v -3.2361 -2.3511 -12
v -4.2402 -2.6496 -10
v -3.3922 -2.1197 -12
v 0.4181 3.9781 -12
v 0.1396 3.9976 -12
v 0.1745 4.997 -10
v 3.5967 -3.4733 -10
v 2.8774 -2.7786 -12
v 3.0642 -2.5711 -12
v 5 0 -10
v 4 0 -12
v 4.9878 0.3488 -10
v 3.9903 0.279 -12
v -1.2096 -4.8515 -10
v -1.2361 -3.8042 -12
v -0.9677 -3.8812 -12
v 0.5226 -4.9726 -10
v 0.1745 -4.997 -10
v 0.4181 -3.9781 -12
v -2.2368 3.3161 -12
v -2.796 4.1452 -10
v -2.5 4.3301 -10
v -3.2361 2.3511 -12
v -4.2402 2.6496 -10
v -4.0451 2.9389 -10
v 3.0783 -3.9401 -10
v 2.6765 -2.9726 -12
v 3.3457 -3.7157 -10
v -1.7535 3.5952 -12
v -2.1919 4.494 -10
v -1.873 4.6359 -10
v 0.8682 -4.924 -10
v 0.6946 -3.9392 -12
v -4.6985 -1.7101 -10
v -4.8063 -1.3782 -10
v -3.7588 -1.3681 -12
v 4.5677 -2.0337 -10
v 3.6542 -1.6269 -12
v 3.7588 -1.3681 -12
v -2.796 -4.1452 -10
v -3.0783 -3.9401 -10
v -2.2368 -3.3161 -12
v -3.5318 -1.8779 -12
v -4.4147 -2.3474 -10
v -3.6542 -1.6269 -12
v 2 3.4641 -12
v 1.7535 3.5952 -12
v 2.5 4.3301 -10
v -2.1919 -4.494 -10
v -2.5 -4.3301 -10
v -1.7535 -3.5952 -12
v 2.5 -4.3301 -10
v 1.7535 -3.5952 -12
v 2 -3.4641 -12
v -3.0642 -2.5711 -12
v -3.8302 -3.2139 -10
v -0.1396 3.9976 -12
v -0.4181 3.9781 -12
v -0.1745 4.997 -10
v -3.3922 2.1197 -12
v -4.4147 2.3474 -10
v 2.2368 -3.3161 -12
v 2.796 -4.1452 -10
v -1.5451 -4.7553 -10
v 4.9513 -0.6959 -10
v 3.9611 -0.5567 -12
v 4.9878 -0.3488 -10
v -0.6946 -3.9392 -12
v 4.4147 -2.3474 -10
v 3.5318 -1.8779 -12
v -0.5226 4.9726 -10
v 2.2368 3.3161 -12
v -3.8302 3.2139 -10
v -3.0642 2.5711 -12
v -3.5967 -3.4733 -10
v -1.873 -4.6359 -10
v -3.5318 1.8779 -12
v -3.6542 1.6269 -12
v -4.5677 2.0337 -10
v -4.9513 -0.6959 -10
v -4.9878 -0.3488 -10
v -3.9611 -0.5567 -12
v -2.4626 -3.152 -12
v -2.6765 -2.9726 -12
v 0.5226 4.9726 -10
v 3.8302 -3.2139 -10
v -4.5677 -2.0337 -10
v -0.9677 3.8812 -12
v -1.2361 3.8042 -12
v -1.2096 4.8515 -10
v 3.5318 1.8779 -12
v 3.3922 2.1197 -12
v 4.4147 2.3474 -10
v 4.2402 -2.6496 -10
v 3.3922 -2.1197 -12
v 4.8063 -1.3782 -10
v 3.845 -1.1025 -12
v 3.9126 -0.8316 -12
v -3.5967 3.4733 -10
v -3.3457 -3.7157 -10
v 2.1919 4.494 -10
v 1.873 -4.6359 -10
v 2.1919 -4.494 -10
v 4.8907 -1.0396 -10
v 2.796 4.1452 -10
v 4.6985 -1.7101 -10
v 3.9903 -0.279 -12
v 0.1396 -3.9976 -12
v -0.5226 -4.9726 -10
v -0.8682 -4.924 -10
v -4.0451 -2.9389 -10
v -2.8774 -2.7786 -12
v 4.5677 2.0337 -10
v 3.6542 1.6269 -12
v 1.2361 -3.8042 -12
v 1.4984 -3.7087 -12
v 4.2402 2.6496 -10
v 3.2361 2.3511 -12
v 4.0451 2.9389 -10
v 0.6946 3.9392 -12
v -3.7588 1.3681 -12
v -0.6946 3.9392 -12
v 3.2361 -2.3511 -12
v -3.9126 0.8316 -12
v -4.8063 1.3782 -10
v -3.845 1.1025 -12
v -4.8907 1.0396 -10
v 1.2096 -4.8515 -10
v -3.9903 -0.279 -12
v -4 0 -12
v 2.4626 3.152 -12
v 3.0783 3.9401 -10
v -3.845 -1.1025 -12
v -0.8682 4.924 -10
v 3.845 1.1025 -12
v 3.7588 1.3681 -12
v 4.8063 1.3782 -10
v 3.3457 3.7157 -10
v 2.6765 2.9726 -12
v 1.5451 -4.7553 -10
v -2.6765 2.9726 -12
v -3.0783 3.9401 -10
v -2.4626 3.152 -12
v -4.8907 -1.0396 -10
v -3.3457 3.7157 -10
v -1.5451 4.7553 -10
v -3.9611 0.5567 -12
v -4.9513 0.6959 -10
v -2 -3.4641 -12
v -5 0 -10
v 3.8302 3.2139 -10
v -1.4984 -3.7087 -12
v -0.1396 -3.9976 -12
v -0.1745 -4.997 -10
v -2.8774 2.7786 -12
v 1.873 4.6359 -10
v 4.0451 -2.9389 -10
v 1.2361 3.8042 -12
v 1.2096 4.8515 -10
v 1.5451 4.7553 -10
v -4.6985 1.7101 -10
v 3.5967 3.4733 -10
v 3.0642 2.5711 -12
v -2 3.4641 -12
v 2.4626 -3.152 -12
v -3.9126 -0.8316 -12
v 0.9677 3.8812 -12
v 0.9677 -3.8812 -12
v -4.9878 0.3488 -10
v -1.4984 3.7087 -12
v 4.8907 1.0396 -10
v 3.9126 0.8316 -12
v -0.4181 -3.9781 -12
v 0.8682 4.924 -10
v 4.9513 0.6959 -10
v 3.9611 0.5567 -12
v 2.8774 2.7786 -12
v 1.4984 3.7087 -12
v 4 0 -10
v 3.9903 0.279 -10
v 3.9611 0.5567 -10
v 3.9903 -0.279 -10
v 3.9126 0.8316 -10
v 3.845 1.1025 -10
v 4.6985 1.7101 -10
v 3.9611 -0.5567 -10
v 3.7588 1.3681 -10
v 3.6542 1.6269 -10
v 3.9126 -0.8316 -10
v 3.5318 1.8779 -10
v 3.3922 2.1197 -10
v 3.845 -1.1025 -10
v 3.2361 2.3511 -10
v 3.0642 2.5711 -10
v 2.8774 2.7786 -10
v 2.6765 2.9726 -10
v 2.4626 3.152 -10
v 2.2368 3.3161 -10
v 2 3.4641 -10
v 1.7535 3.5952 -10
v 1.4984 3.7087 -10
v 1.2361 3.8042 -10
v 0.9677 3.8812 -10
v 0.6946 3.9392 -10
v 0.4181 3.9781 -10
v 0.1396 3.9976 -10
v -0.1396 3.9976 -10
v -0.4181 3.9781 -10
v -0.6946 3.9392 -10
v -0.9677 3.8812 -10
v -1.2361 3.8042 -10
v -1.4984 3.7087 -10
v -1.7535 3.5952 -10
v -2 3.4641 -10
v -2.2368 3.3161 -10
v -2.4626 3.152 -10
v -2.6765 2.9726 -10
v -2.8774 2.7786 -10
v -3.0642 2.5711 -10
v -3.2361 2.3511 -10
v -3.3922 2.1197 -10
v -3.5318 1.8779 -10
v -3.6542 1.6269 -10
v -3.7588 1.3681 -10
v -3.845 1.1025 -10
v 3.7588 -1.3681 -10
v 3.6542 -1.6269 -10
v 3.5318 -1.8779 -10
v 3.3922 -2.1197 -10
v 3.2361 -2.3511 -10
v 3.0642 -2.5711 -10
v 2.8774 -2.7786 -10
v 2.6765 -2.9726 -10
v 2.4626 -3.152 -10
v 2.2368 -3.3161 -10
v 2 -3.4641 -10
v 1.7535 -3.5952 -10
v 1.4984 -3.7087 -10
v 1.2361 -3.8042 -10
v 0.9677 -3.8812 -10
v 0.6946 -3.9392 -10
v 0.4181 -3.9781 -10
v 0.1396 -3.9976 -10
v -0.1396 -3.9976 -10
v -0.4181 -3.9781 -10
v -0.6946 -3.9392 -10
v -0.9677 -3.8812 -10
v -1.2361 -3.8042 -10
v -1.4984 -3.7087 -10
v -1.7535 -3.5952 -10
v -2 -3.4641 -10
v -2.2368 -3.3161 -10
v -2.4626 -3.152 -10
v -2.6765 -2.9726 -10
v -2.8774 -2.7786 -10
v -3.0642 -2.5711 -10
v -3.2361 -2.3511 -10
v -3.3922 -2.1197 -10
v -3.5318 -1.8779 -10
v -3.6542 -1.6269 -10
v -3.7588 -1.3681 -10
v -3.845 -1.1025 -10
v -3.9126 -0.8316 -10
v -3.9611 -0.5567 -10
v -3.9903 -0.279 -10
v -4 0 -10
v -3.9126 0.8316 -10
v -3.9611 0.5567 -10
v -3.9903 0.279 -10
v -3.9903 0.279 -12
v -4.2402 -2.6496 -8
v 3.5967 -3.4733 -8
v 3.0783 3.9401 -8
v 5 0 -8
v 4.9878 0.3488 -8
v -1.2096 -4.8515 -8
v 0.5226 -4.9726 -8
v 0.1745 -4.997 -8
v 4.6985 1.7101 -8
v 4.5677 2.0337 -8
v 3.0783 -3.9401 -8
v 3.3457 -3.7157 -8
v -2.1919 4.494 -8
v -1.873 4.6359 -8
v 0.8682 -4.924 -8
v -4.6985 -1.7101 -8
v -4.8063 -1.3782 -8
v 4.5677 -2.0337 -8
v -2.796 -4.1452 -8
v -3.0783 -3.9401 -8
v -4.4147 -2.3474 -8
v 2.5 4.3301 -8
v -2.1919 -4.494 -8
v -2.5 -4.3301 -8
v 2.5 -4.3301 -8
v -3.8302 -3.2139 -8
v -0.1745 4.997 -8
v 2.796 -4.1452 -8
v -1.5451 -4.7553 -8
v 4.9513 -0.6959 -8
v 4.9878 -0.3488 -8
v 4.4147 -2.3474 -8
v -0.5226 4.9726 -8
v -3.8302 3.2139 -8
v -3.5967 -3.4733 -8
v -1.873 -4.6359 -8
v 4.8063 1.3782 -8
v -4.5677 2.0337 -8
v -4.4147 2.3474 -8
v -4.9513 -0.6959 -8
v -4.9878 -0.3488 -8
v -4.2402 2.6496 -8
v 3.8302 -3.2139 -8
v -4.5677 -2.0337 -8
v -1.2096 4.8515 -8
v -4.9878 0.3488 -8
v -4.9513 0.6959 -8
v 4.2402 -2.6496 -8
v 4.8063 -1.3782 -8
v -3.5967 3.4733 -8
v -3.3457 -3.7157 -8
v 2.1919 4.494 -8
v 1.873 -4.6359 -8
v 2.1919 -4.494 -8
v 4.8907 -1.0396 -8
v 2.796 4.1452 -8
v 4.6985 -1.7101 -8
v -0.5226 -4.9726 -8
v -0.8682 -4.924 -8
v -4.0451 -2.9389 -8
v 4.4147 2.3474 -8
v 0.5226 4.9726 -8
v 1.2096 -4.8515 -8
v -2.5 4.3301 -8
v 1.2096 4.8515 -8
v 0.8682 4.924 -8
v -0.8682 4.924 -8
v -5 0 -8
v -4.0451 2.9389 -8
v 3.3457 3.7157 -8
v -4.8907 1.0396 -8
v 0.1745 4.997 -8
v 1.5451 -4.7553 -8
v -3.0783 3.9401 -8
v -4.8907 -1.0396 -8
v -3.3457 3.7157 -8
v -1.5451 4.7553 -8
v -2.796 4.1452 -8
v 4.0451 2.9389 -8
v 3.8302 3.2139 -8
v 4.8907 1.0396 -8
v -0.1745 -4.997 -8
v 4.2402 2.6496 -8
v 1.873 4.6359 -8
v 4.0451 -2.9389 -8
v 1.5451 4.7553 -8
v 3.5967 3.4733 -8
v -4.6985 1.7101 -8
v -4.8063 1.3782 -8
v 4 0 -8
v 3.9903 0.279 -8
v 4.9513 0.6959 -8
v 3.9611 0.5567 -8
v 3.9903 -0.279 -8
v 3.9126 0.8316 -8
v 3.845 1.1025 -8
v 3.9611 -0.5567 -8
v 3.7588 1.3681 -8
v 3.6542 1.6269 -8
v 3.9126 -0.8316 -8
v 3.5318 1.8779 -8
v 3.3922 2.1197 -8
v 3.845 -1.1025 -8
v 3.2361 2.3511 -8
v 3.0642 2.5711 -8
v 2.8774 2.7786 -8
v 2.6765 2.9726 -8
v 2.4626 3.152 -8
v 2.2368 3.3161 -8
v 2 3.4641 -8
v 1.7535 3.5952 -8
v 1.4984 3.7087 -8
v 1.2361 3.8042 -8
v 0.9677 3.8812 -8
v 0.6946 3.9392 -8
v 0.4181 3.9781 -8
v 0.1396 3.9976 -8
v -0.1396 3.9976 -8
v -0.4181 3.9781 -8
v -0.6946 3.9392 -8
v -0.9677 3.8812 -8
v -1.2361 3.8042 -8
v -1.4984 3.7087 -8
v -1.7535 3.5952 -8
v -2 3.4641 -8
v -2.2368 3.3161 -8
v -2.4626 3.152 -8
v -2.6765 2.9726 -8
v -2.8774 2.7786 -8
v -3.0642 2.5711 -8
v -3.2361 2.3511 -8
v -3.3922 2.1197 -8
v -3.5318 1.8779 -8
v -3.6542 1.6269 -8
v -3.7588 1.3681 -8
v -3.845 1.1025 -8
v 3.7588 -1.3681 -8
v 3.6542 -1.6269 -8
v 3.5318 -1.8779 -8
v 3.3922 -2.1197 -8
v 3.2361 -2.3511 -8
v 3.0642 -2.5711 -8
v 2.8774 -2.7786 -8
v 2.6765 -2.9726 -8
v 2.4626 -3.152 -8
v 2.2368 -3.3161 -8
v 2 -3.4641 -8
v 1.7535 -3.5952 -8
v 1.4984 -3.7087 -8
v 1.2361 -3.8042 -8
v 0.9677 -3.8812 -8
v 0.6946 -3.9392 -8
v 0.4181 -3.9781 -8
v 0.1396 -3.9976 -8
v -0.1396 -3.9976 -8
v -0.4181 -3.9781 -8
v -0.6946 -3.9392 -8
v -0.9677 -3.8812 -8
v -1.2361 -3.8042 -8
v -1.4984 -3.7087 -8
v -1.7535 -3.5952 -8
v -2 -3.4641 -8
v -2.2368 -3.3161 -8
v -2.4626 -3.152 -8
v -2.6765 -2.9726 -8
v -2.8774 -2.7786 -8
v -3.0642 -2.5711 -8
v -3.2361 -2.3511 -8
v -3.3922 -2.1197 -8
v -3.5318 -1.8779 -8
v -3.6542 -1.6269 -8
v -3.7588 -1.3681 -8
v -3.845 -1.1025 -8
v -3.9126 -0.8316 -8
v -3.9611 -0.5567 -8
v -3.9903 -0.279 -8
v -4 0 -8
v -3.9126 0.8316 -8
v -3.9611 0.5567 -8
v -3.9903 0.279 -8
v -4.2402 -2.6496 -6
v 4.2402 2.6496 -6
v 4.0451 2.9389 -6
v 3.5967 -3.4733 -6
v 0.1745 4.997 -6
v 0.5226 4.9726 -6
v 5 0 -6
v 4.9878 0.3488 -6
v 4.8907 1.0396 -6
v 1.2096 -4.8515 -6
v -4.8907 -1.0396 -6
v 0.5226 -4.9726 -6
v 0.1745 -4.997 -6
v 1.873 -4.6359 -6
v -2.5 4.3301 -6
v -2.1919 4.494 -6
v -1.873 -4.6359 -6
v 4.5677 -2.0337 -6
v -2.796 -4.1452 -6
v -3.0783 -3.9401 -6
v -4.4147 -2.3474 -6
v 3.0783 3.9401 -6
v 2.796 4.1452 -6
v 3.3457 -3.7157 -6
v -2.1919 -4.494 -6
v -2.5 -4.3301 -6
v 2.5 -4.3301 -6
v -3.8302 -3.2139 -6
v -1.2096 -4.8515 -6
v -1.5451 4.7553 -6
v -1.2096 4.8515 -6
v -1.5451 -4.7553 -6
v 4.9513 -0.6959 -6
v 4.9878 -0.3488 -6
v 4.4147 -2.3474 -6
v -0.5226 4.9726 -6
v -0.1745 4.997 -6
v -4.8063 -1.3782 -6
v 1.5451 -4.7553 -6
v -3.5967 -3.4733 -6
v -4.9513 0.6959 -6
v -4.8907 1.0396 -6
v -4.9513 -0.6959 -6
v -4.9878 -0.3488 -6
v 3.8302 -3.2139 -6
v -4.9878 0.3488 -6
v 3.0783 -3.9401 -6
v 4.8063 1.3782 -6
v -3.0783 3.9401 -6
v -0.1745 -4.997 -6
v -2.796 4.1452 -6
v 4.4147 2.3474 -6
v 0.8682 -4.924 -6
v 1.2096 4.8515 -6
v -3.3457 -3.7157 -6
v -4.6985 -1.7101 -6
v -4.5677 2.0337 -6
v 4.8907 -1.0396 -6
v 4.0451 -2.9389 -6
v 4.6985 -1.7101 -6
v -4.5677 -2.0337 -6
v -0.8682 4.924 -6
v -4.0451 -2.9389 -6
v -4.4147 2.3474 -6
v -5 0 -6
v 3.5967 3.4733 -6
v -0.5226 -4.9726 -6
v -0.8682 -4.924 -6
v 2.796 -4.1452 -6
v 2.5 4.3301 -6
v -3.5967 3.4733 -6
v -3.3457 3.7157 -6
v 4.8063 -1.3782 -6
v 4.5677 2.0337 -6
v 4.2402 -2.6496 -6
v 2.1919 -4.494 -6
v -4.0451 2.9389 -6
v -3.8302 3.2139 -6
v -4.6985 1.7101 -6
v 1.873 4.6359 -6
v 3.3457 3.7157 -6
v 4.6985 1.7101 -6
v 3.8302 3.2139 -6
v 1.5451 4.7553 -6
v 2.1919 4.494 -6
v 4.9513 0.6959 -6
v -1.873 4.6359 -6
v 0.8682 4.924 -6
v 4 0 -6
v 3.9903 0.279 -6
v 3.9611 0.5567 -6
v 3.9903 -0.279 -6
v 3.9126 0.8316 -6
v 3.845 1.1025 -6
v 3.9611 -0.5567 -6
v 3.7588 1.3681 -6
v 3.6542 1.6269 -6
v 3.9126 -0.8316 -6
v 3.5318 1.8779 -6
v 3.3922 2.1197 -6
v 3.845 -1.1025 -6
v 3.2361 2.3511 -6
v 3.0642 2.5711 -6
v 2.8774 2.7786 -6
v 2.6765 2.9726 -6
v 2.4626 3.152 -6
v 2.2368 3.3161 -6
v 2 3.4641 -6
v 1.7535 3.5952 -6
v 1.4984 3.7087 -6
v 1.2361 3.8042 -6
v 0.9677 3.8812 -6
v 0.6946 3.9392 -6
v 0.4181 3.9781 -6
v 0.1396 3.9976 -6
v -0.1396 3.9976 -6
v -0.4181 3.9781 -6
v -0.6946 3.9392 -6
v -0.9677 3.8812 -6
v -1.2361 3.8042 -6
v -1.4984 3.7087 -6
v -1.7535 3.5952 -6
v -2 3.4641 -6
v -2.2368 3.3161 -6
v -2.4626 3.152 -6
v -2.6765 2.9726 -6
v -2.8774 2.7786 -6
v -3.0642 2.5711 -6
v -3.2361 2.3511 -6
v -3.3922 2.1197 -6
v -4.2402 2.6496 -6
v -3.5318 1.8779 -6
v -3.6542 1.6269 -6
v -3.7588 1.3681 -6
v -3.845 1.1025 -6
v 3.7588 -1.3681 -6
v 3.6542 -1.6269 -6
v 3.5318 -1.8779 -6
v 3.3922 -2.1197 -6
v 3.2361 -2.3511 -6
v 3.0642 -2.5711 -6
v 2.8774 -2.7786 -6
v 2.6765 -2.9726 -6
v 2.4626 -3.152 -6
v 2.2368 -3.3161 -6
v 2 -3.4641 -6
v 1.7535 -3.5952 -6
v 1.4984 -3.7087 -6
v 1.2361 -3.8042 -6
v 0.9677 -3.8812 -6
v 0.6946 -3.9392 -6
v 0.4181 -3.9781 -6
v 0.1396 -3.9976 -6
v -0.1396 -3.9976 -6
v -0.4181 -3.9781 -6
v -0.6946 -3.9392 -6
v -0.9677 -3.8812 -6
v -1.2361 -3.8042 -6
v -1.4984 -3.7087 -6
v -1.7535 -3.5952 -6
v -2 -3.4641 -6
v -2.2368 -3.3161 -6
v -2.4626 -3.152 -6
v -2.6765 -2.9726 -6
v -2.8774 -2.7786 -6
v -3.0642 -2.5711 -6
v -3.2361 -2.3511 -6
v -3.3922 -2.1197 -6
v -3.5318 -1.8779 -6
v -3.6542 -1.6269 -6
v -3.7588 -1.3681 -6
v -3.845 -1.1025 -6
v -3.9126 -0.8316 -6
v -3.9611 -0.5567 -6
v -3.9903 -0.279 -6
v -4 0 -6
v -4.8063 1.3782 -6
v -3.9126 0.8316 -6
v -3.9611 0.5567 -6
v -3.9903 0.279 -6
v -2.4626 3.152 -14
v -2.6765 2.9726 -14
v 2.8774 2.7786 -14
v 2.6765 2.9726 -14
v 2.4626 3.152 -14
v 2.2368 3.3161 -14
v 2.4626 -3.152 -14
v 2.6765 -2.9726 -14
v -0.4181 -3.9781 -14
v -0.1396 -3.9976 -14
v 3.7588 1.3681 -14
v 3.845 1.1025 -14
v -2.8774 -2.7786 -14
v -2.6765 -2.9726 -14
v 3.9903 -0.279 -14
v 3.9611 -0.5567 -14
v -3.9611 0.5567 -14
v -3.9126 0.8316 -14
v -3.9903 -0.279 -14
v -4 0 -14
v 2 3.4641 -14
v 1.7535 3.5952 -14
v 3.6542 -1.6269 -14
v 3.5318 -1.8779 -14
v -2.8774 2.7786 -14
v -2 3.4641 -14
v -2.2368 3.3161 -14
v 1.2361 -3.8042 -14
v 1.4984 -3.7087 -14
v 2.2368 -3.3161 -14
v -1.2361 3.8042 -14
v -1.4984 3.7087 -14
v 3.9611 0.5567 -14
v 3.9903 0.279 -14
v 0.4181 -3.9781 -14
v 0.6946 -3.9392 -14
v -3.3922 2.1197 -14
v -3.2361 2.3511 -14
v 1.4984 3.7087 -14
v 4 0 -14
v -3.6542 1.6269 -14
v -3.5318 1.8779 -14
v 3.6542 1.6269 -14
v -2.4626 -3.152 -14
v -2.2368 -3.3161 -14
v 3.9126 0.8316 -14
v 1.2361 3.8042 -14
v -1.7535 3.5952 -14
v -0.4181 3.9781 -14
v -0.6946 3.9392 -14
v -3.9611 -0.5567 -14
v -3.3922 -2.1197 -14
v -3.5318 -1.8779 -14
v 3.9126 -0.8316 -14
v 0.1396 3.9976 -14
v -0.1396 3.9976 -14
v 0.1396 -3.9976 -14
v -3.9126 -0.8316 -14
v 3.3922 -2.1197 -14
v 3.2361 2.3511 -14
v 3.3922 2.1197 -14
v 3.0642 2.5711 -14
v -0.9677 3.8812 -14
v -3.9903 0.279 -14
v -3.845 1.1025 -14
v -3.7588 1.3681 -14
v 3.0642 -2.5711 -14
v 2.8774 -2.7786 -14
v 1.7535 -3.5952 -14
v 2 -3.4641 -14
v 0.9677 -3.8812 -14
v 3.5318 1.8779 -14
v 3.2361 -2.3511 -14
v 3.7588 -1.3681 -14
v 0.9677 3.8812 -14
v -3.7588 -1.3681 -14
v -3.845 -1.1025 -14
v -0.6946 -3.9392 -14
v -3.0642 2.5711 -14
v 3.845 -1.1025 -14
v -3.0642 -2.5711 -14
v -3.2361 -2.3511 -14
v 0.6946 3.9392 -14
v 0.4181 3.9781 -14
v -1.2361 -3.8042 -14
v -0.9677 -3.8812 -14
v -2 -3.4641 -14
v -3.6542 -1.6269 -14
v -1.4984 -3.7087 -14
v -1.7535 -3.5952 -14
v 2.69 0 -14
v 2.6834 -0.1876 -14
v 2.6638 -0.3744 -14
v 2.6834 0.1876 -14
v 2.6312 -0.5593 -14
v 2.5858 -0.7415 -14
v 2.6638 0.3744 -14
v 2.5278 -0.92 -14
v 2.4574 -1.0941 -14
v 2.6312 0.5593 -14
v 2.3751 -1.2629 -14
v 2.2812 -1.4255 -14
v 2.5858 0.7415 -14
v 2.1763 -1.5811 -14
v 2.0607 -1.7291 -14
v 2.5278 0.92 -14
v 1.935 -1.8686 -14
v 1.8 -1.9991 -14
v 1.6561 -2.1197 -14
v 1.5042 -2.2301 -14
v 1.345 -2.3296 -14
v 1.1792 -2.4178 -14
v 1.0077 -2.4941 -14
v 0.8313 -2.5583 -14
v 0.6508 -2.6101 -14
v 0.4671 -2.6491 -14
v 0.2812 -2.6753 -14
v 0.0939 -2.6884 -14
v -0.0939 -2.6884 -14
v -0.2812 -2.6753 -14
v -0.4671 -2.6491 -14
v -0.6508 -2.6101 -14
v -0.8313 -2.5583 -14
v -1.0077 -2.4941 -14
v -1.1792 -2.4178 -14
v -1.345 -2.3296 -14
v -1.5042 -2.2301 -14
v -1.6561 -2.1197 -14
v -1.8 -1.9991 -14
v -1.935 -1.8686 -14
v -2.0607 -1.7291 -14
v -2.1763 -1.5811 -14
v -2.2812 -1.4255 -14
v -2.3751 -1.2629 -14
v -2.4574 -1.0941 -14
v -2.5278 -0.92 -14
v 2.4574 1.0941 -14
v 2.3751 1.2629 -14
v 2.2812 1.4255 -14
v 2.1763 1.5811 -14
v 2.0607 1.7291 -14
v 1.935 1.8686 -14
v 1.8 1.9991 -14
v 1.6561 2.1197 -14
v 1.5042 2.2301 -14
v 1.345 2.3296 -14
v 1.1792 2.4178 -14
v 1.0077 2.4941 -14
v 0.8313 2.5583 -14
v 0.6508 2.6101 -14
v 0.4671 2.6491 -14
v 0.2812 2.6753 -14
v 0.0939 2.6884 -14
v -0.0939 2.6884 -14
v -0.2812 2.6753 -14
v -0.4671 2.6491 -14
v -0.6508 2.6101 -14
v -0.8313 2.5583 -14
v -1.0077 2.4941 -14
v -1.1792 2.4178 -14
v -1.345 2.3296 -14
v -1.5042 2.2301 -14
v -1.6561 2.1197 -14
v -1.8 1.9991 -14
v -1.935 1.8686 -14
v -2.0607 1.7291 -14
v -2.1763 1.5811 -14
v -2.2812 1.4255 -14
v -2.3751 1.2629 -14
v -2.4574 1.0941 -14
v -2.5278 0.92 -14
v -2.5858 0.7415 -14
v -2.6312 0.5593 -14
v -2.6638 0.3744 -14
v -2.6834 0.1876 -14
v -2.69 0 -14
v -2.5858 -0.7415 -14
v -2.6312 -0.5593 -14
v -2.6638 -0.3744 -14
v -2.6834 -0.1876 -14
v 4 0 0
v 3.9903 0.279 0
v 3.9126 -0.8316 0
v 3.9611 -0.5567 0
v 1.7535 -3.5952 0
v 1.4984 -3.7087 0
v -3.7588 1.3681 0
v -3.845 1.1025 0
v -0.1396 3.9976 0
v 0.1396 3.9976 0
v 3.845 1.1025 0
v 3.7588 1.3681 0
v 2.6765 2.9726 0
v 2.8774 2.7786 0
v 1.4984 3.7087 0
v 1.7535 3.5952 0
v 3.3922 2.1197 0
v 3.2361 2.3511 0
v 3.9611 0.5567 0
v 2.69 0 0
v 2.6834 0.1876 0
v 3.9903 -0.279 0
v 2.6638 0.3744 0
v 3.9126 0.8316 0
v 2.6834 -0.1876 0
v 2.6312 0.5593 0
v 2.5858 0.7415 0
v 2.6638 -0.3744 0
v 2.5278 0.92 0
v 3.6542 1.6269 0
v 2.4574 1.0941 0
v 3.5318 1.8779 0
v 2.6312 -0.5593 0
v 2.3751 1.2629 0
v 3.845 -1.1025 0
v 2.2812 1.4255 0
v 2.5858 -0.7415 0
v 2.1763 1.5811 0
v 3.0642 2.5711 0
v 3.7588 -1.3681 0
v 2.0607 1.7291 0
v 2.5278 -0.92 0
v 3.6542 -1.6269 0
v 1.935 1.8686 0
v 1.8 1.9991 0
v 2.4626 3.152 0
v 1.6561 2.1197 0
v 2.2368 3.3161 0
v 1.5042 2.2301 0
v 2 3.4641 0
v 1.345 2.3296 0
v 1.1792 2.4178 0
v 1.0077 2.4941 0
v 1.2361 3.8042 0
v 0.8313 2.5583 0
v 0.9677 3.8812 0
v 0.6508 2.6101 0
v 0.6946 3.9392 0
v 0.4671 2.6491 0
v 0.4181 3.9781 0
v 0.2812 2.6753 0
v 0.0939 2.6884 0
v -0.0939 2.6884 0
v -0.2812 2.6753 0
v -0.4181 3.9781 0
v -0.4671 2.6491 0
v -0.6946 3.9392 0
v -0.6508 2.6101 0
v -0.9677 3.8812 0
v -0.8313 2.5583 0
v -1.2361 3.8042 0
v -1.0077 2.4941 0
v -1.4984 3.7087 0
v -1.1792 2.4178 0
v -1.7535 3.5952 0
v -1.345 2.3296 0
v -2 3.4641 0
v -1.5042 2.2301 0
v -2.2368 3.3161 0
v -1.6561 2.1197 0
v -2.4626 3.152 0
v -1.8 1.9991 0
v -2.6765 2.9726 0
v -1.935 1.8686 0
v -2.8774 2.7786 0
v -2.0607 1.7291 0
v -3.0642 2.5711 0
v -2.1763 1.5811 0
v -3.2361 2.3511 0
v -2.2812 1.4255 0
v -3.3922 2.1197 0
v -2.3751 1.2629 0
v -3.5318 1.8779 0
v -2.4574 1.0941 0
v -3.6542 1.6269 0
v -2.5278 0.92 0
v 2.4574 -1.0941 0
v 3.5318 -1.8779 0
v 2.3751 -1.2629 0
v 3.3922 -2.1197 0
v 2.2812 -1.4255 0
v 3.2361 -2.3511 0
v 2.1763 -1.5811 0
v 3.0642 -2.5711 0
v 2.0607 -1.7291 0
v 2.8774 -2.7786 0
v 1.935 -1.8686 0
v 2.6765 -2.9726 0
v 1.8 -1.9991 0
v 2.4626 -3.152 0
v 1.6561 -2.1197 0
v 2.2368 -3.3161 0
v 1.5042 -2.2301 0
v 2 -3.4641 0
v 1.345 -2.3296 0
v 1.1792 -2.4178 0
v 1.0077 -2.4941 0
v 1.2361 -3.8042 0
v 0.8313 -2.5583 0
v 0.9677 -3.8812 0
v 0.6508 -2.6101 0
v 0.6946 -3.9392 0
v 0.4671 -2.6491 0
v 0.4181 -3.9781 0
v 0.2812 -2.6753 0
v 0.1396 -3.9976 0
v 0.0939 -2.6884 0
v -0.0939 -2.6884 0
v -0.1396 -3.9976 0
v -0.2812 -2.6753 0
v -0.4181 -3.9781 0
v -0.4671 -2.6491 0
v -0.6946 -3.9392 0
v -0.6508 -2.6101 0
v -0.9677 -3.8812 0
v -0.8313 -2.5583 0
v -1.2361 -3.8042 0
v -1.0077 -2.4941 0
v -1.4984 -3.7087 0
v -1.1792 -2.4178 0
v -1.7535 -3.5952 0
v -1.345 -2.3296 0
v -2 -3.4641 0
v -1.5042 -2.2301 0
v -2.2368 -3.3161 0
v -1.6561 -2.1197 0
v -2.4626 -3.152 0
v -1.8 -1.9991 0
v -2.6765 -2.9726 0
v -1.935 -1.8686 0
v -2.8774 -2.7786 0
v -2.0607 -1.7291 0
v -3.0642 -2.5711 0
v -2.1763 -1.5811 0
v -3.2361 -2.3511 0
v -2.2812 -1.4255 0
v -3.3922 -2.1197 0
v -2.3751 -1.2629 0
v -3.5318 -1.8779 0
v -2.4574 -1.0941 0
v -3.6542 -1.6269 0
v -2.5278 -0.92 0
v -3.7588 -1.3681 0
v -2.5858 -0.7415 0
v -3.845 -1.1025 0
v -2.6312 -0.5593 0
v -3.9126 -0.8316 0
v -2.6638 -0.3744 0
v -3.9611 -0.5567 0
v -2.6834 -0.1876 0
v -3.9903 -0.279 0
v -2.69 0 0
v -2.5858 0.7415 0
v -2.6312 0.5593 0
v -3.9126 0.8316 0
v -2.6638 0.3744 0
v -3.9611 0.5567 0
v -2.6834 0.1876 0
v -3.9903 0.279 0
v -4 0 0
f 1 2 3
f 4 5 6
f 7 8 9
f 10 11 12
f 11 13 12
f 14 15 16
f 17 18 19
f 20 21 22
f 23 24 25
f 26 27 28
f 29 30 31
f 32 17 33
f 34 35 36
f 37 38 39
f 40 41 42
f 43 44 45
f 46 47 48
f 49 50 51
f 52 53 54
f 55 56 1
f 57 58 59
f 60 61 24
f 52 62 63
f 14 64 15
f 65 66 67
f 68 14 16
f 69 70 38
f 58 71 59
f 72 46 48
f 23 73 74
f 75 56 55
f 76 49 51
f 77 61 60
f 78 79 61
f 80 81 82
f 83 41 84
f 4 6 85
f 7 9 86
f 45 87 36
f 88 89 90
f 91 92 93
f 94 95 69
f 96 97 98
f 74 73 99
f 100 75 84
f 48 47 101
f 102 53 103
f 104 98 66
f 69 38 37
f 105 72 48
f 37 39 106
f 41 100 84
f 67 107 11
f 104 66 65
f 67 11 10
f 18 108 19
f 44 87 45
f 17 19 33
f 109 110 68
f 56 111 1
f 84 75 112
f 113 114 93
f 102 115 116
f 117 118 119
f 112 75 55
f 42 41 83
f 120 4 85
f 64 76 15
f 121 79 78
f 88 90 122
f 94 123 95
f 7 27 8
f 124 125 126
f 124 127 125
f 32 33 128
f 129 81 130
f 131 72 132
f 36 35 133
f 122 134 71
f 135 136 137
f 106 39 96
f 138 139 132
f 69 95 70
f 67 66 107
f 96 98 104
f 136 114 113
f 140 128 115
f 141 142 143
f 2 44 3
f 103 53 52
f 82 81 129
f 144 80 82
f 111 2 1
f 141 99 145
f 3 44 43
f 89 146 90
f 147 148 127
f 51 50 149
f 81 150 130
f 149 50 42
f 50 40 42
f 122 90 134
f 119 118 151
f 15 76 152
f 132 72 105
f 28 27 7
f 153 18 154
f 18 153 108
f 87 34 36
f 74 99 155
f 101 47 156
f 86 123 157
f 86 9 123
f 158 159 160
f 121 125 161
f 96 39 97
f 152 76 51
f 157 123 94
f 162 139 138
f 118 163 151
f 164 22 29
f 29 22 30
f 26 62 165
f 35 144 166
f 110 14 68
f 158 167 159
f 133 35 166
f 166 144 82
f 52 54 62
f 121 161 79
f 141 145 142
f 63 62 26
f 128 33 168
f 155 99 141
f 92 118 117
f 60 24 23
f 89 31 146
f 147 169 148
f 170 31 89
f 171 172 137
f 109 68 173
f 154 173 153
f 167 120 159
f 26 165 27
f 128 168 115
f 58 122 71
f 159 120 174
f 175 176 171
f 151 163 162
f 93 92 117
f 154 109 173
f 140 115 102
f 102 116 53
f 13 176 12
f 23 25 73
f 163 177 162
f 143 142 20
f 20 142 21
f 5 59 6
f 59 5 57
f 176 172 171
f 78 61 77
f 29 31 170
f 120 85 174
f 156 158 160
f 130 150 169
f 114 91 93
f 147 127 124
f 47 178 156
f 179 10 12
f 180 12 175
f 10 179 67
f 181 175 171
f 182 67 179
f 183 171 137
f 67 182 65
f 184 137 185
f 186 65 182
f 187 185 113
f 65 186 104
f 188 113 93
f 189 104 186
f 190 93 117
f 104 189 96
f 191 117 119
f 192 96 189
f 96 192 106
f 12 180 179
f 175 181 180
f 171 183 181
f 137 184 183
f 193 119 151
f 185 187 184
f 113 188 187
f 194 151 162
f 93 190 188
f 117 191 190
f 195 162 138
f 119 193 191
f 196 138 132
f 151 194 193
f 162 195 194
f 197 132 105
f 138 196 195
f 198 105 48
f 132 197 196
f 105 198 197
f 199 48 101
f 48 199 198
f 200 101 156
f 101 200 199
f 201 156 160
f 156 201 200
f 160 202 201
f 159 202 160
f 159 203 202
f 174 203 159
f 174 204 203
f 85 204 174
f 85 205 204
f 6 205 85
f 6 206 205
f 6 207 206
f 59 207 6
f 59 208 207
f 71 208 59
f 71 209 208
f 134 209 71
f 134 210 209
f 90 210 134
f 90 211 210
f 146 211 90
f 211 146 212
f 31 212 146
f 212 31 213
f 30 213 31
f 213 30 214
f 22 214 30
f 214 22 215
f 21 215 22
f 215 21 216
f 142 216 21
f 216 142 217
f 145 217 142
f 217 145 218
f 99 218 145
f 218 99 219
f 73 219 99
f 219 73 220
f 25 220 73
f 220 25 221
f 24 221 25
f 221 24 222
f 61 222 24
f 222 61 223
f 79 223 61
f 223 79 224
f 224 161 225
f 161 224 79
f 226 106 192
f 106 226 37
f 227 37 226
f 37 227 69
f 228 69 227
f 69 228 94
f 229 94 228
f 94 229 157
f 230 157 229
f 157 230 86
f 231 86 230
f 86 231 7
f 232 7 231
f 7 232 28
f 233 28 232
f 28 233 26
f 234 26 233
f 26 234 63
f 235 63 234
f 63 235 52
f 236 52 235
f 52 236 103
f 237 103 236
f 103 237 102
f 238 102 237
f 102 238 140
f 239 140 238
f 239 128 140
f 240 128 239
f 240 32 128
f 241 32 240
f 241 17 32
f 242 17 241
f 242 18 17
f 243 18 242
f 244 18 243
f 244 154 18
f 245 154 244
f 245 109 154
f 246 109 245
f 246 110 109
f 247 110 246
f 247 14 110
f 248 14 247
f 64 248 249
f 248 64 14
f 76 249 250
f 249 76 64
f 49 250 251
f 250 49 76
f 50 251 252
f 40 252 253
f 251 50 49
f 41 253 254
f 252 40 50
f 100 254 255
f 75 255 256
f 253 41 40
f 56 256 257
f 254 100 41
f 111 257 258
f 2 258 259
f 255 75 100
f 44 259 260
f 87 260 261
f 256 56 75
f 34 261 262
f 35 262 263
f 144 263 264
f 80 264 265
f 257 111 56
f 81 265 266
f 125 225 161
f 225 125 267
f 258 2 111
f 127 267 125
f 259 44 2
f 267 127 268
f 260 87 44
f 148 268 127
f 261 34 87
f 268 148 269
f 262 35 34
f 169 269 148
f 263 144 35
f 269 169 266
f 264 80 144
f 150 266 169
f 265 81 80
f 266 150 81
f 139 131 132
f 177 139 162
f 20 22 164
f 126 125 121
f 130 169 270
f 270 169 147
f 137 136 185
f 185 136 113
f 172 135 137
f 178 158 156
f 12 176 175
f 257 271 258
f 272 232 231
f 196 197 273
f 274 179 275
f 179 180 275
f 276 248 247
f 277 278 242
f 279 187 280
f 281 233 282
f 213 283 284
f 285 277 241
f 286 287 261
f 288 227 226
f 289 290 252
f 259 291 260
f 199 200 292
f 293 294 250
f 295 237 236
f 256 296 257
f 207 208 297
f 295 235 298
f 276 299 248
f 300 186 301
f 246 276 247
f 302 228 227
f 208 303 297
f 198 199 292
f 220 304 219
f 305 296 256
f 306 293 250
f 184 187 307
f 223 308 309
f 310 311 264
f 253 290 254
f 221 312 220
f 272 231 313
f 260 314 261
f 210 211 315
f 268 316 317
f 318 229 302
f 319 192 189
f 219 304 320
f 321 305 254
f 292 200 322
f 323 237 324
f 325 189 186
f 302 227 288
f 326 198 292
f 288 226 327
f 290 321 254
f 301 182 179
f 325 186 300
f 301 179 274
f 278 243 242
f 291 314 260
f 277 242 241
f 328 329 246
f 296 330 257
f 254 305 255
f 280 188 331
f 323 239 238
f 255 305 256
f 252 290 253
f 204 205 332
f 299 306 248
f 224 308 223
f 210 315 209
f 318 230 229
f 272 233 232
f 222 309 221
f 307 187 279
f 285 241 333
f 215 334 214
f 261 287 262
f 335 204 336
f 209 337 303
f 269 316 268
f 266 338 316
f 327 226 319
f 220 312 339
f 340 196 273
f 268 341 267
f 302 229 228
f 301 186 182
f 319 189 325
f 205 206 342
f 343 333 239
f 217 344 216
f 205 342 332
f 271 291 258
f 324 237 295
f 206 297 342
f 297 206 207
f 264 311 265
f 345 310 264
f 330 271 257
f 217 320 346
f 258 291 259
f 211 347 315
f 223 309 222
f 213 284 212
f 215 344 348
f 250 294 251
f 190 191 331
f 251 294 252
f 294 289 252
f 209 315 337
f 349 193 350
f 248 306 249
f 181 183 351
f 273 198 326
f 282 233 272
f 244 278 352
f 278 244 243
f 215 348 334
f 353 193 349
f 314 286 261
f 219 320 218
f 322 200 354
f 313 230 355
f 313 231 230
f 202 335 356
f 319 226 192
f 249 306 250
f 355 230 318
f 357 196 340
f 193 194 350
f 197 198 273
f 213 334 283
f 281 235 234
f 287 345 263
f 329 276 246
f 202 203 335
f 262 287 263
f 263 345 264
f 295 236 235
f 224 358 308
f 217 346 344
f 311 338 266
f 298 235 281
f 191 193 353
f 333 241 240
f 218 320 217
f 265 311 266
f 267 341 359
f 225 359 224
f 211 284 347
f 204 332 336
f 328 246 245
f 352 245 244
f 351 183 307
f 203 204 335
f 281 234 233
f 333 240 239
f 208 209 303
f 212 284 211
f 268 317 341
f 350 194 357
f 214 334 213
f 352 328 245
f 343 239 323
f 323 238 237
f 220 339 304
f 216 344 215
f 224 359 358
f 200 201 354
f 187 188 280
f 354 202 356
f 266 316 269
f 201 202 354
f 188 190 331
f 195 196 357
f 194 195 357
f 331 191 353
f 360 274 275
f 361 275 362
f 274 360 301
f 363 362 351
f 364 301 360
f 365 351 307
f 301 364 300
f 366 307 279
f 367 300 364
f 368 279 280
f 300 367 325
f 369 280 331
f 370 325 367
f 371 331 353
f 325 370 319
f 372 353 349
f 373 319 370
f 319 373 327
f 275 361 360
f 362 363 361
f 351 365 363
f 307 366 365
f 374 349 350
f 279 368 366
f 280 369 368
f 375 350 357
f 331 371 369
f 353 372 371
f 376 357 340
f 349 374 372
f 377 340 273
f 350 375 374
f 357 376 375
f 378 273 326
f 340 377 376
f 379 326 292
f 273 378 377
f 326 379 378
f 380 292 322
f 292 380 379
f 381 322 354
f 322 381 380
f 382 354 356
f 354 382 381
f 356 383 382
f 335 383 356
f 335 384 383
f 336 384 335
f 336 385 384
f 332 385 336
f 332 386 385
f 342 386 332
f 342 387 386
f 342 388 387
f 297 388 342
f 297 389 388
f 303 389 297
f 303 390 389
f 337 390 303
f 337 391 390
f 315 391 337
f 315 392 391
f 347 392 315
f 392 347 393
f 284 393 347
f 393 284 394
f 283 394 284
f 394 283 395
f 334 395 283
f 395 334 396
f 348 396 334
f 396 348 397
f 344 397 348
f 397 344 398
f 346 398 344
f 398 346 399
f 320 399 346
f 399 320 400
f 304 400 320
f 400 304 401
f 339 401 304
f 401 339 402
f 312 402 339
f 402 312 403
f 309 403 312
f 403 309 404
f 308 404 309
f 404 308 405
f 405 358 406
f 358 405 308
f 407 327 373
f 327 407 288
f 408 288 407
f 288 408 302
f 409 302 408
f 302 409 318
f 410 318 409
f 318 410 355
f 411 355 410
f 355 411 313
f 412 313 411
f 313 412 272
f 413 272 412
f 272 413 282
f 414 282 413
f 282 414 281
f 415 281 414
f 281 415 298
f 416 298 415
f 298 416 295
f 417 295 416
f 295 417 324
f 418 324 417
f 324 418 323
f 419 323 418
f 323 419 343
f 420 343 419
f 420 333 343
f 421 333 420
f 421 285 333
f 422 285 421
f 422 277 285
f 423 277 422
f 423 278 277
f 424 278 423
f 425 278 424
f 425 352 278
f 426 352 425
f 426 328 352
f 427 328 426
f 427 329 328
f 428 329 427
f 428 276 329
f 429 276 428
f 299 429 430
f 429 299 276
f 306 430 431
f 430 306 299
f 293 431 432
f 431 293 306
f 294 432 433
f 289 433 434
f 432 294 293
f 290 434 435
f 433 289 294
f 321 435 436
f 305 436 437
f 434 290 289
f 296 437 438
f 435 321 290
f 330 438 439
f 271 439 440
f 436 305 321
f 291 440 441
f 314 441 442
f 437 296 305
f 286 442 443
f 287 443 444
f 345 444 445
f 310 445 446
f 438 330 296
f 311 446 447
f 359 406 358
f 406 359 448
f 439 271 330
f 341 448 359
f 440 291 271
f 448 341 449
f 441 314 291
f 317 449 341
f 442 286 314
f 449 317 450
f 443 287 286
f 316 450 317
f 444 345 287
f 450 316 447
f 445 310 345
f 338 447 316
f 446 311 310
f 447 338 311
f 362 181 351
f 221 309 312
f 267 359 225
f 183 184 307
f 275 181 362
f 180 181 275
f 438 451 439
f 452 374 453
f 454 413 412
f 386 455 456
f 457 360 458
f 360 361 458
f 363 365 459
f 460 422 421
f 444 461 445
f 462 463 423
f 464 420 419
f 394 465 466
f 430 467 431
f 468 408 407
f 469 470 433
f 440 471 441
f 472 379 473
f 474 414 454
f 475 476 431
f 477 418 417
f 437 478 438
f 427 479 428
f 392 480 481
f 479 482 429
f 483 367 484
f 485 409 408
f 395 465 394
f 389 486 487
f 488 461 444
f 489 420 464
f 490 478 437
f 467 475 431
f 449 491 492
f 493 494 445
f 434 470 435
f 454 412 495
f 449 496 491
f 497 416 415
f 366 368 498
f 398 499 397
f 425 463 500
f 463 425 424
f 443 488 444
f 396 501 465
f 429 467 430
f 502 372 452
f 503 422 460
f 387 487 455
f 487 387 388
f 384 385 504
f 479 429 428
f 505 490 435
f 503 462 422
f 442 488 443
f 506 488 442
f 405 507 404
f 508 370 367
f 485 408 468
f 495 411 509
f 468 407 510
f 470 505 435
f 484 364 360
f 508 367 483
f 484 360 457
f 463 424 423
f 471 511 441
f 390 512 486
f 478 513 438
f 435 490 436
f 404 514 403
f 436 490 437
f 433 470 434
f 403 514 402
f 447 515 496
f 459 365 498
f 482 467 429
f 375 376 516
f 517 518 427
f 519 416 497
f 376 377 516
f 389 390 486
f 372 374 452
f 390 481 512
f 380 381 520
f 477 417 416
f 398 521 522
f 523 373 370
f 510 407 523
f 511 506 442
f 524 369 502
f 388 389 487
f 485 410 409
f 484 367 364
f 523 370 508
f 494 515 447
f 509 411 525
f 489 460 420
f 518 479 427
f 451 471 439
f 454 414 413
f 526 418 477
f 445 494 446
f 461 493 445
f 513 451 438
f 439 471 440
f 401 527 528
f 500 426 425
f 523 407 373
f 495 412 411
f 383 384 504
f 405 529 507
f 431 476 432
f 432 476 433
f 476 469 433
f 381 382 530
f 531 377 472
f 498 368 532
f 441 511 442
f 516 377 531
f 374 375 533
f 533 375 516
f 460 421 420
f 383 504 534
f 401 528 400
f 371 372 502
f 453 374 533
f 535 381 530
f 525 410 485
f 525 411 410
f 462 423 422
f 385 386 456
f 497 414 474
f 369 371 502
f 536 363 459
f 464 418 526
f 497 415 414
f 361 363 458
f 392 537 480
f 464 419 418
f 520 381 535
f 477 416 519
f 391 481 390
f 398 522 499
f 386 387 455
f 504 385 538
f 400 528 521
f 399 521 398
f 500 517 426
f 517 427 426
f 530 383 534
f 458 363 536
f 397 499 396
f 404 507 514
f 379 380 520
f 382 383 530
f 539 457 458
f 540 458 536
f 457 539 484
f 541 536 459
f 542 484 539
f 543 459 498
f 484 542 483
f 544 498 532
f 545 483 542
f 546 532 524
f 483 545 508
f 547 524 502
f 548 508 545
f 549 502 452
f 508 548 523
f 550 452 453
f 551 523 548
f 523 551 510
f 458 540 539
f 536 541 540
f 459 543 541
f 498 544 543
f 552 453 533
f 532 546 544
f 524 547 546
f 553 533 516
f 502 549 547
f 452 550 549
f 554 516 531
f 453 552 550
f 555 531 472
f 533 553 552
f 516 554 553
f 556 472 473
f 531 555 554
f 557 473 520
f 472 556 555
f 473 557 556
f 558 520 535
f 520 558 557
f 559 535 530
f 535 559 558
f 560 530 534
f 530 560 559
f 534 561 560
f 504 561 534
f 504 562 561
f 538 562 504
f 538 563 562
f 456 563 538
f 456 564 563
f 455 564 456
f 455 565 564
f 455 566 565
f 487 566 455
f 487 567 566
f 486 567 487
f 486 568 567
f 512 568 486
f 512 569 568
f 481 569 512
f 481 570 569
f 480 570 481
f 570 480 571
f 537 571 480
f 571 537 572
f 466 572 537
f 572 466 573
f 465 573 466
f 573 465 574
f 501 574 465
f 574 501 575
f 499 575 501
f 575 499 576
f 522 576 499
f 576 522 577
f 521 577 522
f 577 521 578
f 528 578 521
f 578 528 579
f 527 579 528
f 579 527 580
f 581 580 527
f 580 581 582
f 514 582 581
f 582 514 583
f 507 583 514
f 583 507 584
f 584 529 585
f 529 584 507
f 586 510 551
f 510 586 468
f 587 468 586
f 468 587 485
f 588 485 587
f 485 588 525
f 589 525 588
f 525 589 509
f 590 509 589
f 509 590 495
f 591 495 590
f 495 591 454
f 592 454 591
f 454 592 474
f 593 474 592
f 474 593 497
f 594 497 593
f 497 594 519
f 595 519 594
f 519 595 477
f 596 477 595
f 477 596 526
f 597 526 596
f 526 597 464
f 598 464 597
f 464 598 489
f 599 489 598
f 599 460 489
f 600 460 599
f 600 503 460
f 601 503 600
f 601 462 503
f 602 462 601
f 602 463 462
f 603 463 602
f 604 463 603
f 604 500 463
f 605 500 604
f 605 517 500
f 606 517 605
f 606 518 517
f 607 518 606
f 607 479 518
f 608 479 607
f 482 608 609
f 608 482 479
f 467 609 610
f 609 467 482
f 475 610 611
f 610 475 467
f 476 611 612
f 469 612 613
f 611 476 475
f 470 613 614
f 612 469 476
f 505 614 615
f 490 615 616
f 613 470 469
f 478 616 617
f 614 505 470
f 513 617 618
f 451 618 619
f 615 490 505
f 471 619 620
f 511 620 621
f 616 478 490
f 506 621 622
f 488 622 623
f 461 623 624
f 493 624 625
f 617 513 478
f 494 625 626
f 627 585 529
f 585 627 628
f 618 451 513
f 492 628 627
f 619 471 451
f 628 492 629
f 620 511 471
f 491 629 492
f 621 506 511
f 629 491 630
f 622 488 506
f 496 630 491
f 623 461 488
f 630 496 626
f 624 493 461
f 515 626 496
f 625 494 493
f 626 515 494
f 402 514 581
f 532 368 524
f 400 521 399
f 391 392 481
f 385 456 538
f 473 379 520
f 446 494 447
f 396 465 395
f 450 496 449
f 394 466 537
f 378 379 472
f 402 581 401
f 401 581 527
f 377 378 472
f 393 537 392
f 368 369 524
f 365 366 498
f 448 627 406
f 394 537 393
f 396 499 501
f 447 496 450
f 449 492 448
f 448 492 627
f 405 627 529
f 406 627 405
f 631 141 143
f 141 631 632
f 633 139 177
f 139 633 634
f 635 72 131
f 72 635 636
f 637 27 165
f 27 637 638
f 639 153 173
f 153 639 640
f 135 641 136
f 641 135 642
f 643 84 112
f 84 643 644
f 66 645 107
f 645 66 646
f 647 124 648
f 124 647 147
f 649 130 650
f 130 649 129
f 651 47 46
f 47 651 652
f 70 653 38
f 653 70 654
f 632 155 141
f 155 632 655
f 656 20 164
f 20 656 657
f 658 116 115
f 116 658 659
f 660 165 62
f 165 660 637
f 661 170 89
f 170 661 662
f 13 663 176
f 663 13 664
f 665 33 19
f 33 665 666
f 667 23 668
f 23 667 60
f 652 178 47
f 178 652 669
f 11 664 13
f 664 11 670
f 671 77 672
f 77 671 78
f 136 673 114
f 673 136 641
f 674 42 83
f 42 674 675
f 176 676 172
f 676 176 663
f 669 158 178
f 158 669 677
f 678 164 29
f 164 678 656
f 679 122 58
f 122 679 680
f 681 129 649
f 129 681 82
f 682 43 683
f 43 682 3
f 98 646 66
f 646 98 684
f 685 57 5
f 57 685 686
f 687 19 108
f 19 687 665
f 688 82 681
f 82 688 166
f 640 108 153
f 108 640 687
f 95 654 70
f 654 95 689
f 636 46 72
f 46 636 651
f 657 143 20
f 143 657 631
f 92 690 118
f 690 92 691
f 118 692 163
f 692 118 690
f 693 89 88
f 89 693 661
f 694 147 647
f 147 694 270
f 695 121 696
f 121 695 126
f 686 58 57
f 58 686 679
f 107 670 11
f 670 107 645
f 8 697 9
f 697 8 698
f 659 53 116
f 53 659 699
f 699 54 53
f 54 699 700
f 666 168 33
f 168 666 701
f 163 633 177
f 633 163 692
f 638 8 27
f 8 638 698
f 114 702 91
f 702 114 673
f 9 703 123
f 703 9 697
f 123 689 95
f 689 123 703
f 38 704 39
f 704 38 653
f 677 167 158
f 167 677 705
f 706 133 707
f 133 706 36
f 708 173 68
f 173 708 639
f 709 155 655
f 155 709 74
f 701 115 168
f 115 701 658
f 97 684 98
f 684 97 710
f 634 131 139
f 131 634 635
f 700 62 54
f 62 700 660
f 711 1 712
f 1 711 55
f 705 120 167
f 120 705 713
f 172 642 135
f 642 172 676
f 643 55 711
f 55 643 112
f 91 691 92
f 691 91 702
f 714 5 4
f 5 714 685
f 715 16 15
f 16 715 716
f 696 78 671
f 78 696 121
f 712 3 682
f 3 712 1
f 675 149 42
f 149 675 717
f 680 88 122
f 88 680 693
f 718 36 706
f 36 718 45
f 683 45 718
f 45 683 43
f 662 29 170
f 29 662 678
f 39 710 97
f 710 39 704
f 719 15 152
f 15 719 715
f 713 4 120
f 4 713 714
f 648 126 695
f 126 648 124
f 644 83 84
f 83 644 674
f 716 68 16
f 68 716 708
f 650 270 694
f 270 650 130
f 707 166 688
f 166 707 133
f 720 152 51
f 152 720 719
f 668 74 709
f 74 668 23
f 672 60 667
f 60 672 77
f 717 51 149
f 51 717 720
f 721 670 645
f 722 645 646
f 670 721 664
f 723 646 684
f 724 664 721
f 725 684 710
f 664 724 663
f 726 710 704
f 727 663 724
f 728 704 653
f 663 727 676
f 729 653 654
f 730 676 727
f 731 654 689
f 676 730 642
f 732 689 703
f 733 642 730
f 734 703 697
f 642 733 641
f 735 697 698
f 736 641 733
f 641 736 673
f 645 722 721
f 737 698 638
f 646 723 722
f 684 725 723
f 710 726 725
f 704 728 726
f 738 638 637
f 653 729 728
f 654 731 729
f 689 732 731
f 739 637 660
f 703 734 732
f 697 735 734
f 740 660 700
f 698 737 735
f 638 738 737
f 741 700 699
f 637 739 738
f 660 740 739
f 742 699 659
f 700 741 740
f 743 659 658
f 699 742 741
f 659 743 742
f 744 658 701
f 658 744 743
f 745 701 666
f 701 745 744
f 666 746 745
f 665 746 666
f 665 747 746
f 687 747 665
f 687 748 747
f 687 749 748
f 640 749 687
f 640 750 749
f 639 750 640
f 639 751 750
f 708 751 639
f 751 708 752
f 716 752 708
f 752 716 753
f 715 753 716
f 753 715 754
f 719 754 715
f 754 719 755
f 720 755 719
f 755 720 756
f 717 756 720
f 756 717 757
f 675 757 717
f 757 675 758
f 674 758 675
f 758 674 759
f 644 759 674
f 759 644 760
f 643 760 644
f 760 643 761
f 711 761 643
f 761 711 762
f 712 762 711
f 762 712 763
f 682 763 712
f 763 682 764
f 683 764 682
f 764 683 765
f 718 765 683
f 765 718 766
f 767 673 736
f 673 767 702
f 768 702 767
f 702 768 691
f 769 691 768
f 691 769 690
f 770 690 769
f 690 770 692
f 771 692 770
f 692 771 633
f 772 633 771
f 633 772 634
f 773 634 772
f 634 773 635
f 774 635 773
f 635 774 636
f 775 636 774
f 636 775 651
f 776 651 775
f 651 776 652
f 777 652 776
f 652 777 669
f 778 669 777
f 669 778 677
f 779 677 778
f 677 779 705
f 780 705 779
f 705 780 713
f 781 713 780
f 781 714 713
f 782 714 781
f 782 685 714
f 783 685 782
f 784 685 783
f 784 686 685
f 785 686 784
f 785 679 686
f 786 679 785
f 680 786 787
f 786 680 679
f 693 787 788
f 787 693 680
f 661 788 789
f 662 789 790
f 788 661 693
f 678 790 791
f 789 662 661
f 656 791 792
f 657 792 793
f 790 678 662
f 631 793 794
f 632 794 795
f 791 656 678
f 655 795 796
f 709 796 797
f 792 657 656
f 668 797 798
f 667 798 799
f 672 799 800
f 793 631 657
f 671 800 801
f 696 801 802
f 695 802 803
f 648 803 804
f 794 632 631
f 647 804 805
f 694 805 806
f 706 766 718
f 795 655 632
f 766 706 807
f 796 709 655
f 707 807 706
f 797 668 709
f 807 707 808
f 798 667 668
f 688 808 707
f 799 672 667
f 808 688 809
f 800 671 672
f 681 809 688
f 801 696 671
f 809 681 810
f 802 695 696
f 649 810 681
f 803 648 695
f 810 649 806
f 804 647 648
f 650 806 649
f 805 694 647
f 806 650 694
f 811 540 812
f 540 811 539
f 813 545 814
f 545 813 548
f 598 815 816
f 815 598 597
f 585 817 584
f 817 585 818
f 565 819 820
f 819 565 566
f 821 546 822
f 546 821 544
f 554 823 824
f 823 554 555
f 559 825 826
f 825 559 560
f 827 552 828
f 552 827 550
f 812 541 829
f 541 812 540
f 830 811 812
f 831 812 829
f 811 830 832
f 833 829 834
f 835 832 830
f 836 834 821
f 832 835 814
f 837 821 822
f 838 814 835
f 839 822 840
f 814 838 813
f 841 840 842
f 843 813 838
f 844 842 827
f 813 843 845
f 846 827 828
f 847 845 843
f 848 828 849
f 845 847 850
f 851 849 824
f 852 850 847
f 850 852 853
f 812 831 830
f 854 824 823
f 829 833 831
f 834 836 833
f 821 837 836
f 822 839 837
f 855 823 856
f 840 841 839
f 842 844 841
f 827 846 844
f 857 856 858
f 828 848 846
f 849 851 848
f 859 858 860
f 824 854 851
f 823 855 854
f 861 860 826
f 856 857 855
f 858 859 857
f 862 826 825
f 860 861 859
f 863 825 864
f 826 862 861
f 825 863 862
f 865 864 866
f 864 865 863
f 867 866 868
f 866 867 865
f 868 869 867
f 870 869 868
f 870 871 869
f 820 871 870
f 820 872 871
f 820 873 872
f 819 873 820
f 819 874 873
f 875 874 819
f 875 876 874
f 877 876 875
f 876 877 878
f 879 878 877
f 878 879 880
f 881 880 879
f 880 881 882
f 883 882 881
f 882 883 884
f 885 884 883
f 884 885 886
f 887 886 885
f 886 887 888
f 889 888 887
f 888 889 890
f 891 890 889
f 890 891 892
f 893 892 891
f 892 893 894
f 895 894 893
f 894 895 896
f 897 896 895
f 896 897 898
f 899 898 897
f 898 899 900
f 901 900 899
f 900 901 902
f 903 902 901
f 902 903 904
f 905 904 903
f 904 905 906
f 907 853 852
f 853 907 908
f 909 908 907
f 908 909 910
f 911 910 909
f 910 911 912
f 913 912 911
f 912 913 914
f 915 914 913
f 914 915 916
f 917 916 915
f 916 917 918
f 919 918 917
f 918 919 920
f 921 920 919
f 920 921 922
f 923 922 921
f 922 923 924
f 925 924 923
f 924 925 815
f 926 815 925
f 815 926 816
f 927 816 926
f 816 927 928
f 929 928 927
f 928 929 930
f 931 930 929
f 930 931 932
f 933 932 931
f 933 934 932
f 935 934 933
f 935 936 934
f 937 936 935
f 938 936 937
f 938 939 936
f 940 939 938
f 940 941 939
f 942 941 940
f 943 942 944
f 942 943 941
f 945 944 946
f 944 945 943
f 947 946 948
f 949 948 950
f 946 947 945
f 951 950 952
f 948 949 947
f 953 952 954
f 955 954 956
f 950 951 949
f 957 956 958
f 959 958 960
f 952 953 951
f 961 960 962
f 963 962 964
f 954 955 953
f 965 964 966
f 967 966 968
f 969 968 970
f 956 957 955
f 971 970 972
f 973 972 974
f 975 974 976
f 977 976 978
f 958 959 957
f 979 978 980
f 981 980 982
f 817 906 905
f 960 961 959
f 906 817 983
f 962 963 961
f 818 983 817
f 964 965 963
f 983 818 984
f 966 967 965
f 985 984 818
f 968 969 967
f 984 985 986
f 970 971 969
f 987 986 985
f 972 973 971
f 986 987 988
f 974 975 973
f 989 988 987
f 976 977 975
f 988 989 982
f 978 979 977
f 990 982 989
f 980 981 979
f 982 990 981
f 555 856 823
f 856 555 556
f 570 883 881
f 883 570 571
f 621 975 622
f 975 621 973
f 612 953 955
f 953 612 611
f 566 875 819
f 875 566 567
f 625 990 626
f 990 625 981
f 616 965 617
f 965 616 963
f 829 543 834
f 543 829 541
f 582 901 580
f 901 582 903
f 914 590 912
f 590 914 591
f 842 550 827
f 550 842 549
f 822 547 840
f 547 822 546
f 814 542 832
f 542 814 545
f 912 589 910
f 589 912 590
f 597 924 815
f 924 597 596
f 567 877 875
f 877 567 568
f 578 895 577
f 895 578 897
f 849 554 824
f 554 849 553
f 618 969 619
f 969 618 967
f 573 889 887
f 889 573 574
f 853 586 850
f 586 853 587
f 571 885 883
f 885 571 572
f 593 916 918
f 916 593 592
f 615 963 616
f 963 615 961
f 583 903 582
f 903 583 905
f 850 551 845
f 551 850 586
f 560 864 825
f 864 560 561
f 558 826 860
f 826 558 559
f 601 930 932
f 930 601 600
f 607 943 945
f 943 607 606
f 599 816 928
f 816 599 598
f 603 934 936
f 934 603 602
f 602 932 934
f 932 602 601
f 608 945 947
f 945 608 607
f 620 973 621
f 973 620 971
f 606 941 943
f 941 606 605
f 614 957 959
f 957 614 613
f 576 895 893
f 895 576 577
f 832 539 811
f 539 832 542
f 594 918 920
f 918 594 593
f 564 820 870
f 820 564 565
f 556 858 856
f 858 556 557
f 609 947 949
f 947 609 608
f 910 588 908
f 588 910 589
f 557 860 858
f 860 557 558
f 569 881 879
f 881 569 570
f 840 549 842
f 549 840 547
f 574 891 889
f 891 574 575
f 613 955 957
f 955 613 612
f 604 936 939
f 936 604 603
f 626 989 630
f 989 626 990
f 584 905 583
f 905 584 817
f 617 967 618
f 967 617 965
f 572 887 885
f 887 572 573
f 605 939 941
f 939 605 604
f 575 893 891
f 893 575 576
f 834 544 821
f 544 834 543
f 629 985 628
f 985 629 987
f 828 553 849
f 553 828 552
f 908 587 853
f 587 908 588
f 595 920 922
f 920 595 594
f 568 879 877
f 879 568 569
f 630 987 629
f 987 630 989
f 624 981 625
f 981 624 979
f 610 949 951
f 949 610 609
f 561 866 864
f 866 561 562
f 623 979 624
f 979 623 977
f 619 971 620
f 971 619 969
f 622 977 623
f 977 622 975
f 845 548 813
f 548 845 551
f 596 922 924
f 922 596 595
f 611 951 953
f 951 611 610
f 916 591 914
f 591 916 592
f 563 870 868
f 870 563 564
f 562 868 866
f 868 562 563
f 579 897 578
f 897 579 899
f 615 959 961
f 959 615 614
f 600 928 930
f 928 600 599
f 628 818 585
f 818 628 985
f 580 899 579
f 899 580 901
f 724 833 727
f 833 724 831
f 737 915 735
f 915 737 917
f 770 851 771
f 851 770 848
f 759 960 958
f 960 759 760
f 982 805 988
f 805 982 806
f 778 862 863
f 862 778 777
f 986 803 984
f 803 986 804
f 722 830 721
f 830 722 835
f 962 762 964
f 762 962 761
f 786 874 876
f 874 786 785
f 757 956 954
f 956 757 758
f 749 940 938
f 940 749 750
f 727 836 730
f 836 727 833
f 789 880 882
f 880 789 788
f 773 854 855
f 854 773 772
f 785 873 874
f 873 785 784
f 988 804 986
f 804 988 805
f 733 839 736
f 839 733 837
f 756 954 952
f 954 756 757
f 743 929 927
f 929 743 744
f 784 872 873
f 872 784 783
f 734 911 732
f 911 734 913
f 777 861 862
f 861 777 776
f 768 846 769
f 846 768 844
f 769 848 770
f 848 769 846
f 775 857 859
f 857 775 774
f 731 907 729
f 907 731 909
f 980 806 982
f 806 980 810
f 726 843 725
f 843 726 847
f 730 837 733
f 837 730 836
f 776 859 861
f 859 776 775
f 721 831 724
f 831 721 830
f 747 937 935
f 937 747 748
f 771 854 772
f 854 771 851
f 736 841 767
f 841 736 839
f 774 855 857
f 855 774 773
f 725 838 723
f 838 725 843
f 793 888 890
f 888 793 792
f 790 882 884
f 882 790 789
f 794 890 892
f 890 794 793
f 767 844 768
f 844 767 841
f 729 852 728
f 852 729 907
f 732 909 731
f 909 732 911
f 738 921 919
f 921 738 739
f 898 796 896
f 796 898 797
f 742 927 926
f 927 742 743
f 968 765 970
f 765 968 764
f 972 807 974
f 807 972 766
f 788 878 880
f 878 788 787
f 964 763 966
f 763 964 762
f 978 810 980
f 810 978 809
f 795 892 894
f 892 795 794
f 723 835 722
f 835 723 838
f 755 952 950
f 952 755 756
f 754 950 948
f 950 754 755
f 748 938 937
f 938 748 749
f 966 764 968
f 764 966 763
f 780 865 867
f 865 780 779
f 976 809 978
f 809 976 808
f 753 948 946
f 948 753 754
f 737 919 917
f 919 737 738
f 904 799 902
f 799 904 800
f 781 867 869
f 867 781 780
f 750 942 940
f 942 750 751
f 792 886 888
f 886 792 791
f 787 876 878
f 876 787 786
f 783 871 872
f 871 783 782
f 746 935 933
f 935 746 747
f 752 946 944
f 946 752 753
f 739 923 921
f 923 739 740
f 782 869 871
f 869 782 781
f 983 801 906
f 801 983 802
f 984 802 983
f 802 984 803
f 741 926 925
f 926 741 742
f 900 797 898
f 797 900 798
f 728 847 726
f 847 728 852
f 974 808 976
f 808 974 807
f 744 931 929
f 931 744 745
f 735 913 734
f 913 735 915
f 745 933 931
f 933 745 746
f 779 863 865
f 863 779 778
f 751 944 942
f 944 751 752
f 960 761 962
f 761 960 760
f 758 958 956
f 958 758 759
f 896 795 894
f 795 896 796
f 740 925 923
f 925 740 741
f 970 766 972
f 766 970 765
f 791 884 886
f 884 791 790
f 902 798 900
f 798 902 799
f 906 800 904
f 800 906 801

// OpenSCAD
// Super-Duper Parametric Hose Barb
$fn = 90;

// Hose Outer Diameter (used to calculate shlouder length)
hose_od = 9.5;
// Hose Inner Diameter
hose_id = 8;

// How far the barbs swell the diameter.
swell = 2;

// Wall thickness of the barb.
wall_thickness = 1.31;

// Number of barbs.
barbs = 3;
// How far between each barb section?
barb_length = 2;

// Do you want to render the outer shell?
shell = true;

// Do you want to render the bore?
bore = true;

// Flattens the barbs on one end. Usefull if youre printing barbs at angles, as the flattened side can be rotated downward facing the bed.
ezprint = false;

barb(hose_od = hose_od, hose_id = hose_id, swell = swell, wall_thickness = wall_thickness, barbs = barbs, barb_length = barb_length, shell = shell, bore = bore, ezprint = ezprint);

module barb(hose_od = 21.5, hose_id = 15, swell = 1, wall_thickness = 1.31, barbs = 3, barb_length = 2, shell = true, bore = true, ezprint = true) {
    id = hose_id - (2 * wall_thickness);
    translate([0, 0, -((barb_length * (barbs + 1)) + 4.5 + (hose_od - hose_id))])
    difference() {
        union() {
            if (shell == true) {
                cylinder(d = hose_id, h = barb_length);
                for (z = [1 : 1 : barbs]) {
                    translate([0, 0, z * barb_length]) cylinder(d1 = hose_id, d2 = hose_id + swell, h = barb_length);
                }
                translate([0, 0, barb_length * (barbs + 1)]) cylinder(d = hose_id, h = 4.5 + (hose_od - hose_id));
            }
        }
        if (bore == true) {
            translate([0, 0, -1]) cylinder(d = id, h = (barb_length * (barbs + 1)) + 4.5 + (hose_od - hose_id) + 1);
        }
        if (ezprint == true) {
            difference() {
                cylinder(d = hose_id + (swell * 3), h = (barb_length * (barbs + 1)));
                translate([swell, 0, 0]) cylinder(d = hose_id + (swell * 2), h = (barb_length * (barbs + 1)));
            }
        }
    }
}
